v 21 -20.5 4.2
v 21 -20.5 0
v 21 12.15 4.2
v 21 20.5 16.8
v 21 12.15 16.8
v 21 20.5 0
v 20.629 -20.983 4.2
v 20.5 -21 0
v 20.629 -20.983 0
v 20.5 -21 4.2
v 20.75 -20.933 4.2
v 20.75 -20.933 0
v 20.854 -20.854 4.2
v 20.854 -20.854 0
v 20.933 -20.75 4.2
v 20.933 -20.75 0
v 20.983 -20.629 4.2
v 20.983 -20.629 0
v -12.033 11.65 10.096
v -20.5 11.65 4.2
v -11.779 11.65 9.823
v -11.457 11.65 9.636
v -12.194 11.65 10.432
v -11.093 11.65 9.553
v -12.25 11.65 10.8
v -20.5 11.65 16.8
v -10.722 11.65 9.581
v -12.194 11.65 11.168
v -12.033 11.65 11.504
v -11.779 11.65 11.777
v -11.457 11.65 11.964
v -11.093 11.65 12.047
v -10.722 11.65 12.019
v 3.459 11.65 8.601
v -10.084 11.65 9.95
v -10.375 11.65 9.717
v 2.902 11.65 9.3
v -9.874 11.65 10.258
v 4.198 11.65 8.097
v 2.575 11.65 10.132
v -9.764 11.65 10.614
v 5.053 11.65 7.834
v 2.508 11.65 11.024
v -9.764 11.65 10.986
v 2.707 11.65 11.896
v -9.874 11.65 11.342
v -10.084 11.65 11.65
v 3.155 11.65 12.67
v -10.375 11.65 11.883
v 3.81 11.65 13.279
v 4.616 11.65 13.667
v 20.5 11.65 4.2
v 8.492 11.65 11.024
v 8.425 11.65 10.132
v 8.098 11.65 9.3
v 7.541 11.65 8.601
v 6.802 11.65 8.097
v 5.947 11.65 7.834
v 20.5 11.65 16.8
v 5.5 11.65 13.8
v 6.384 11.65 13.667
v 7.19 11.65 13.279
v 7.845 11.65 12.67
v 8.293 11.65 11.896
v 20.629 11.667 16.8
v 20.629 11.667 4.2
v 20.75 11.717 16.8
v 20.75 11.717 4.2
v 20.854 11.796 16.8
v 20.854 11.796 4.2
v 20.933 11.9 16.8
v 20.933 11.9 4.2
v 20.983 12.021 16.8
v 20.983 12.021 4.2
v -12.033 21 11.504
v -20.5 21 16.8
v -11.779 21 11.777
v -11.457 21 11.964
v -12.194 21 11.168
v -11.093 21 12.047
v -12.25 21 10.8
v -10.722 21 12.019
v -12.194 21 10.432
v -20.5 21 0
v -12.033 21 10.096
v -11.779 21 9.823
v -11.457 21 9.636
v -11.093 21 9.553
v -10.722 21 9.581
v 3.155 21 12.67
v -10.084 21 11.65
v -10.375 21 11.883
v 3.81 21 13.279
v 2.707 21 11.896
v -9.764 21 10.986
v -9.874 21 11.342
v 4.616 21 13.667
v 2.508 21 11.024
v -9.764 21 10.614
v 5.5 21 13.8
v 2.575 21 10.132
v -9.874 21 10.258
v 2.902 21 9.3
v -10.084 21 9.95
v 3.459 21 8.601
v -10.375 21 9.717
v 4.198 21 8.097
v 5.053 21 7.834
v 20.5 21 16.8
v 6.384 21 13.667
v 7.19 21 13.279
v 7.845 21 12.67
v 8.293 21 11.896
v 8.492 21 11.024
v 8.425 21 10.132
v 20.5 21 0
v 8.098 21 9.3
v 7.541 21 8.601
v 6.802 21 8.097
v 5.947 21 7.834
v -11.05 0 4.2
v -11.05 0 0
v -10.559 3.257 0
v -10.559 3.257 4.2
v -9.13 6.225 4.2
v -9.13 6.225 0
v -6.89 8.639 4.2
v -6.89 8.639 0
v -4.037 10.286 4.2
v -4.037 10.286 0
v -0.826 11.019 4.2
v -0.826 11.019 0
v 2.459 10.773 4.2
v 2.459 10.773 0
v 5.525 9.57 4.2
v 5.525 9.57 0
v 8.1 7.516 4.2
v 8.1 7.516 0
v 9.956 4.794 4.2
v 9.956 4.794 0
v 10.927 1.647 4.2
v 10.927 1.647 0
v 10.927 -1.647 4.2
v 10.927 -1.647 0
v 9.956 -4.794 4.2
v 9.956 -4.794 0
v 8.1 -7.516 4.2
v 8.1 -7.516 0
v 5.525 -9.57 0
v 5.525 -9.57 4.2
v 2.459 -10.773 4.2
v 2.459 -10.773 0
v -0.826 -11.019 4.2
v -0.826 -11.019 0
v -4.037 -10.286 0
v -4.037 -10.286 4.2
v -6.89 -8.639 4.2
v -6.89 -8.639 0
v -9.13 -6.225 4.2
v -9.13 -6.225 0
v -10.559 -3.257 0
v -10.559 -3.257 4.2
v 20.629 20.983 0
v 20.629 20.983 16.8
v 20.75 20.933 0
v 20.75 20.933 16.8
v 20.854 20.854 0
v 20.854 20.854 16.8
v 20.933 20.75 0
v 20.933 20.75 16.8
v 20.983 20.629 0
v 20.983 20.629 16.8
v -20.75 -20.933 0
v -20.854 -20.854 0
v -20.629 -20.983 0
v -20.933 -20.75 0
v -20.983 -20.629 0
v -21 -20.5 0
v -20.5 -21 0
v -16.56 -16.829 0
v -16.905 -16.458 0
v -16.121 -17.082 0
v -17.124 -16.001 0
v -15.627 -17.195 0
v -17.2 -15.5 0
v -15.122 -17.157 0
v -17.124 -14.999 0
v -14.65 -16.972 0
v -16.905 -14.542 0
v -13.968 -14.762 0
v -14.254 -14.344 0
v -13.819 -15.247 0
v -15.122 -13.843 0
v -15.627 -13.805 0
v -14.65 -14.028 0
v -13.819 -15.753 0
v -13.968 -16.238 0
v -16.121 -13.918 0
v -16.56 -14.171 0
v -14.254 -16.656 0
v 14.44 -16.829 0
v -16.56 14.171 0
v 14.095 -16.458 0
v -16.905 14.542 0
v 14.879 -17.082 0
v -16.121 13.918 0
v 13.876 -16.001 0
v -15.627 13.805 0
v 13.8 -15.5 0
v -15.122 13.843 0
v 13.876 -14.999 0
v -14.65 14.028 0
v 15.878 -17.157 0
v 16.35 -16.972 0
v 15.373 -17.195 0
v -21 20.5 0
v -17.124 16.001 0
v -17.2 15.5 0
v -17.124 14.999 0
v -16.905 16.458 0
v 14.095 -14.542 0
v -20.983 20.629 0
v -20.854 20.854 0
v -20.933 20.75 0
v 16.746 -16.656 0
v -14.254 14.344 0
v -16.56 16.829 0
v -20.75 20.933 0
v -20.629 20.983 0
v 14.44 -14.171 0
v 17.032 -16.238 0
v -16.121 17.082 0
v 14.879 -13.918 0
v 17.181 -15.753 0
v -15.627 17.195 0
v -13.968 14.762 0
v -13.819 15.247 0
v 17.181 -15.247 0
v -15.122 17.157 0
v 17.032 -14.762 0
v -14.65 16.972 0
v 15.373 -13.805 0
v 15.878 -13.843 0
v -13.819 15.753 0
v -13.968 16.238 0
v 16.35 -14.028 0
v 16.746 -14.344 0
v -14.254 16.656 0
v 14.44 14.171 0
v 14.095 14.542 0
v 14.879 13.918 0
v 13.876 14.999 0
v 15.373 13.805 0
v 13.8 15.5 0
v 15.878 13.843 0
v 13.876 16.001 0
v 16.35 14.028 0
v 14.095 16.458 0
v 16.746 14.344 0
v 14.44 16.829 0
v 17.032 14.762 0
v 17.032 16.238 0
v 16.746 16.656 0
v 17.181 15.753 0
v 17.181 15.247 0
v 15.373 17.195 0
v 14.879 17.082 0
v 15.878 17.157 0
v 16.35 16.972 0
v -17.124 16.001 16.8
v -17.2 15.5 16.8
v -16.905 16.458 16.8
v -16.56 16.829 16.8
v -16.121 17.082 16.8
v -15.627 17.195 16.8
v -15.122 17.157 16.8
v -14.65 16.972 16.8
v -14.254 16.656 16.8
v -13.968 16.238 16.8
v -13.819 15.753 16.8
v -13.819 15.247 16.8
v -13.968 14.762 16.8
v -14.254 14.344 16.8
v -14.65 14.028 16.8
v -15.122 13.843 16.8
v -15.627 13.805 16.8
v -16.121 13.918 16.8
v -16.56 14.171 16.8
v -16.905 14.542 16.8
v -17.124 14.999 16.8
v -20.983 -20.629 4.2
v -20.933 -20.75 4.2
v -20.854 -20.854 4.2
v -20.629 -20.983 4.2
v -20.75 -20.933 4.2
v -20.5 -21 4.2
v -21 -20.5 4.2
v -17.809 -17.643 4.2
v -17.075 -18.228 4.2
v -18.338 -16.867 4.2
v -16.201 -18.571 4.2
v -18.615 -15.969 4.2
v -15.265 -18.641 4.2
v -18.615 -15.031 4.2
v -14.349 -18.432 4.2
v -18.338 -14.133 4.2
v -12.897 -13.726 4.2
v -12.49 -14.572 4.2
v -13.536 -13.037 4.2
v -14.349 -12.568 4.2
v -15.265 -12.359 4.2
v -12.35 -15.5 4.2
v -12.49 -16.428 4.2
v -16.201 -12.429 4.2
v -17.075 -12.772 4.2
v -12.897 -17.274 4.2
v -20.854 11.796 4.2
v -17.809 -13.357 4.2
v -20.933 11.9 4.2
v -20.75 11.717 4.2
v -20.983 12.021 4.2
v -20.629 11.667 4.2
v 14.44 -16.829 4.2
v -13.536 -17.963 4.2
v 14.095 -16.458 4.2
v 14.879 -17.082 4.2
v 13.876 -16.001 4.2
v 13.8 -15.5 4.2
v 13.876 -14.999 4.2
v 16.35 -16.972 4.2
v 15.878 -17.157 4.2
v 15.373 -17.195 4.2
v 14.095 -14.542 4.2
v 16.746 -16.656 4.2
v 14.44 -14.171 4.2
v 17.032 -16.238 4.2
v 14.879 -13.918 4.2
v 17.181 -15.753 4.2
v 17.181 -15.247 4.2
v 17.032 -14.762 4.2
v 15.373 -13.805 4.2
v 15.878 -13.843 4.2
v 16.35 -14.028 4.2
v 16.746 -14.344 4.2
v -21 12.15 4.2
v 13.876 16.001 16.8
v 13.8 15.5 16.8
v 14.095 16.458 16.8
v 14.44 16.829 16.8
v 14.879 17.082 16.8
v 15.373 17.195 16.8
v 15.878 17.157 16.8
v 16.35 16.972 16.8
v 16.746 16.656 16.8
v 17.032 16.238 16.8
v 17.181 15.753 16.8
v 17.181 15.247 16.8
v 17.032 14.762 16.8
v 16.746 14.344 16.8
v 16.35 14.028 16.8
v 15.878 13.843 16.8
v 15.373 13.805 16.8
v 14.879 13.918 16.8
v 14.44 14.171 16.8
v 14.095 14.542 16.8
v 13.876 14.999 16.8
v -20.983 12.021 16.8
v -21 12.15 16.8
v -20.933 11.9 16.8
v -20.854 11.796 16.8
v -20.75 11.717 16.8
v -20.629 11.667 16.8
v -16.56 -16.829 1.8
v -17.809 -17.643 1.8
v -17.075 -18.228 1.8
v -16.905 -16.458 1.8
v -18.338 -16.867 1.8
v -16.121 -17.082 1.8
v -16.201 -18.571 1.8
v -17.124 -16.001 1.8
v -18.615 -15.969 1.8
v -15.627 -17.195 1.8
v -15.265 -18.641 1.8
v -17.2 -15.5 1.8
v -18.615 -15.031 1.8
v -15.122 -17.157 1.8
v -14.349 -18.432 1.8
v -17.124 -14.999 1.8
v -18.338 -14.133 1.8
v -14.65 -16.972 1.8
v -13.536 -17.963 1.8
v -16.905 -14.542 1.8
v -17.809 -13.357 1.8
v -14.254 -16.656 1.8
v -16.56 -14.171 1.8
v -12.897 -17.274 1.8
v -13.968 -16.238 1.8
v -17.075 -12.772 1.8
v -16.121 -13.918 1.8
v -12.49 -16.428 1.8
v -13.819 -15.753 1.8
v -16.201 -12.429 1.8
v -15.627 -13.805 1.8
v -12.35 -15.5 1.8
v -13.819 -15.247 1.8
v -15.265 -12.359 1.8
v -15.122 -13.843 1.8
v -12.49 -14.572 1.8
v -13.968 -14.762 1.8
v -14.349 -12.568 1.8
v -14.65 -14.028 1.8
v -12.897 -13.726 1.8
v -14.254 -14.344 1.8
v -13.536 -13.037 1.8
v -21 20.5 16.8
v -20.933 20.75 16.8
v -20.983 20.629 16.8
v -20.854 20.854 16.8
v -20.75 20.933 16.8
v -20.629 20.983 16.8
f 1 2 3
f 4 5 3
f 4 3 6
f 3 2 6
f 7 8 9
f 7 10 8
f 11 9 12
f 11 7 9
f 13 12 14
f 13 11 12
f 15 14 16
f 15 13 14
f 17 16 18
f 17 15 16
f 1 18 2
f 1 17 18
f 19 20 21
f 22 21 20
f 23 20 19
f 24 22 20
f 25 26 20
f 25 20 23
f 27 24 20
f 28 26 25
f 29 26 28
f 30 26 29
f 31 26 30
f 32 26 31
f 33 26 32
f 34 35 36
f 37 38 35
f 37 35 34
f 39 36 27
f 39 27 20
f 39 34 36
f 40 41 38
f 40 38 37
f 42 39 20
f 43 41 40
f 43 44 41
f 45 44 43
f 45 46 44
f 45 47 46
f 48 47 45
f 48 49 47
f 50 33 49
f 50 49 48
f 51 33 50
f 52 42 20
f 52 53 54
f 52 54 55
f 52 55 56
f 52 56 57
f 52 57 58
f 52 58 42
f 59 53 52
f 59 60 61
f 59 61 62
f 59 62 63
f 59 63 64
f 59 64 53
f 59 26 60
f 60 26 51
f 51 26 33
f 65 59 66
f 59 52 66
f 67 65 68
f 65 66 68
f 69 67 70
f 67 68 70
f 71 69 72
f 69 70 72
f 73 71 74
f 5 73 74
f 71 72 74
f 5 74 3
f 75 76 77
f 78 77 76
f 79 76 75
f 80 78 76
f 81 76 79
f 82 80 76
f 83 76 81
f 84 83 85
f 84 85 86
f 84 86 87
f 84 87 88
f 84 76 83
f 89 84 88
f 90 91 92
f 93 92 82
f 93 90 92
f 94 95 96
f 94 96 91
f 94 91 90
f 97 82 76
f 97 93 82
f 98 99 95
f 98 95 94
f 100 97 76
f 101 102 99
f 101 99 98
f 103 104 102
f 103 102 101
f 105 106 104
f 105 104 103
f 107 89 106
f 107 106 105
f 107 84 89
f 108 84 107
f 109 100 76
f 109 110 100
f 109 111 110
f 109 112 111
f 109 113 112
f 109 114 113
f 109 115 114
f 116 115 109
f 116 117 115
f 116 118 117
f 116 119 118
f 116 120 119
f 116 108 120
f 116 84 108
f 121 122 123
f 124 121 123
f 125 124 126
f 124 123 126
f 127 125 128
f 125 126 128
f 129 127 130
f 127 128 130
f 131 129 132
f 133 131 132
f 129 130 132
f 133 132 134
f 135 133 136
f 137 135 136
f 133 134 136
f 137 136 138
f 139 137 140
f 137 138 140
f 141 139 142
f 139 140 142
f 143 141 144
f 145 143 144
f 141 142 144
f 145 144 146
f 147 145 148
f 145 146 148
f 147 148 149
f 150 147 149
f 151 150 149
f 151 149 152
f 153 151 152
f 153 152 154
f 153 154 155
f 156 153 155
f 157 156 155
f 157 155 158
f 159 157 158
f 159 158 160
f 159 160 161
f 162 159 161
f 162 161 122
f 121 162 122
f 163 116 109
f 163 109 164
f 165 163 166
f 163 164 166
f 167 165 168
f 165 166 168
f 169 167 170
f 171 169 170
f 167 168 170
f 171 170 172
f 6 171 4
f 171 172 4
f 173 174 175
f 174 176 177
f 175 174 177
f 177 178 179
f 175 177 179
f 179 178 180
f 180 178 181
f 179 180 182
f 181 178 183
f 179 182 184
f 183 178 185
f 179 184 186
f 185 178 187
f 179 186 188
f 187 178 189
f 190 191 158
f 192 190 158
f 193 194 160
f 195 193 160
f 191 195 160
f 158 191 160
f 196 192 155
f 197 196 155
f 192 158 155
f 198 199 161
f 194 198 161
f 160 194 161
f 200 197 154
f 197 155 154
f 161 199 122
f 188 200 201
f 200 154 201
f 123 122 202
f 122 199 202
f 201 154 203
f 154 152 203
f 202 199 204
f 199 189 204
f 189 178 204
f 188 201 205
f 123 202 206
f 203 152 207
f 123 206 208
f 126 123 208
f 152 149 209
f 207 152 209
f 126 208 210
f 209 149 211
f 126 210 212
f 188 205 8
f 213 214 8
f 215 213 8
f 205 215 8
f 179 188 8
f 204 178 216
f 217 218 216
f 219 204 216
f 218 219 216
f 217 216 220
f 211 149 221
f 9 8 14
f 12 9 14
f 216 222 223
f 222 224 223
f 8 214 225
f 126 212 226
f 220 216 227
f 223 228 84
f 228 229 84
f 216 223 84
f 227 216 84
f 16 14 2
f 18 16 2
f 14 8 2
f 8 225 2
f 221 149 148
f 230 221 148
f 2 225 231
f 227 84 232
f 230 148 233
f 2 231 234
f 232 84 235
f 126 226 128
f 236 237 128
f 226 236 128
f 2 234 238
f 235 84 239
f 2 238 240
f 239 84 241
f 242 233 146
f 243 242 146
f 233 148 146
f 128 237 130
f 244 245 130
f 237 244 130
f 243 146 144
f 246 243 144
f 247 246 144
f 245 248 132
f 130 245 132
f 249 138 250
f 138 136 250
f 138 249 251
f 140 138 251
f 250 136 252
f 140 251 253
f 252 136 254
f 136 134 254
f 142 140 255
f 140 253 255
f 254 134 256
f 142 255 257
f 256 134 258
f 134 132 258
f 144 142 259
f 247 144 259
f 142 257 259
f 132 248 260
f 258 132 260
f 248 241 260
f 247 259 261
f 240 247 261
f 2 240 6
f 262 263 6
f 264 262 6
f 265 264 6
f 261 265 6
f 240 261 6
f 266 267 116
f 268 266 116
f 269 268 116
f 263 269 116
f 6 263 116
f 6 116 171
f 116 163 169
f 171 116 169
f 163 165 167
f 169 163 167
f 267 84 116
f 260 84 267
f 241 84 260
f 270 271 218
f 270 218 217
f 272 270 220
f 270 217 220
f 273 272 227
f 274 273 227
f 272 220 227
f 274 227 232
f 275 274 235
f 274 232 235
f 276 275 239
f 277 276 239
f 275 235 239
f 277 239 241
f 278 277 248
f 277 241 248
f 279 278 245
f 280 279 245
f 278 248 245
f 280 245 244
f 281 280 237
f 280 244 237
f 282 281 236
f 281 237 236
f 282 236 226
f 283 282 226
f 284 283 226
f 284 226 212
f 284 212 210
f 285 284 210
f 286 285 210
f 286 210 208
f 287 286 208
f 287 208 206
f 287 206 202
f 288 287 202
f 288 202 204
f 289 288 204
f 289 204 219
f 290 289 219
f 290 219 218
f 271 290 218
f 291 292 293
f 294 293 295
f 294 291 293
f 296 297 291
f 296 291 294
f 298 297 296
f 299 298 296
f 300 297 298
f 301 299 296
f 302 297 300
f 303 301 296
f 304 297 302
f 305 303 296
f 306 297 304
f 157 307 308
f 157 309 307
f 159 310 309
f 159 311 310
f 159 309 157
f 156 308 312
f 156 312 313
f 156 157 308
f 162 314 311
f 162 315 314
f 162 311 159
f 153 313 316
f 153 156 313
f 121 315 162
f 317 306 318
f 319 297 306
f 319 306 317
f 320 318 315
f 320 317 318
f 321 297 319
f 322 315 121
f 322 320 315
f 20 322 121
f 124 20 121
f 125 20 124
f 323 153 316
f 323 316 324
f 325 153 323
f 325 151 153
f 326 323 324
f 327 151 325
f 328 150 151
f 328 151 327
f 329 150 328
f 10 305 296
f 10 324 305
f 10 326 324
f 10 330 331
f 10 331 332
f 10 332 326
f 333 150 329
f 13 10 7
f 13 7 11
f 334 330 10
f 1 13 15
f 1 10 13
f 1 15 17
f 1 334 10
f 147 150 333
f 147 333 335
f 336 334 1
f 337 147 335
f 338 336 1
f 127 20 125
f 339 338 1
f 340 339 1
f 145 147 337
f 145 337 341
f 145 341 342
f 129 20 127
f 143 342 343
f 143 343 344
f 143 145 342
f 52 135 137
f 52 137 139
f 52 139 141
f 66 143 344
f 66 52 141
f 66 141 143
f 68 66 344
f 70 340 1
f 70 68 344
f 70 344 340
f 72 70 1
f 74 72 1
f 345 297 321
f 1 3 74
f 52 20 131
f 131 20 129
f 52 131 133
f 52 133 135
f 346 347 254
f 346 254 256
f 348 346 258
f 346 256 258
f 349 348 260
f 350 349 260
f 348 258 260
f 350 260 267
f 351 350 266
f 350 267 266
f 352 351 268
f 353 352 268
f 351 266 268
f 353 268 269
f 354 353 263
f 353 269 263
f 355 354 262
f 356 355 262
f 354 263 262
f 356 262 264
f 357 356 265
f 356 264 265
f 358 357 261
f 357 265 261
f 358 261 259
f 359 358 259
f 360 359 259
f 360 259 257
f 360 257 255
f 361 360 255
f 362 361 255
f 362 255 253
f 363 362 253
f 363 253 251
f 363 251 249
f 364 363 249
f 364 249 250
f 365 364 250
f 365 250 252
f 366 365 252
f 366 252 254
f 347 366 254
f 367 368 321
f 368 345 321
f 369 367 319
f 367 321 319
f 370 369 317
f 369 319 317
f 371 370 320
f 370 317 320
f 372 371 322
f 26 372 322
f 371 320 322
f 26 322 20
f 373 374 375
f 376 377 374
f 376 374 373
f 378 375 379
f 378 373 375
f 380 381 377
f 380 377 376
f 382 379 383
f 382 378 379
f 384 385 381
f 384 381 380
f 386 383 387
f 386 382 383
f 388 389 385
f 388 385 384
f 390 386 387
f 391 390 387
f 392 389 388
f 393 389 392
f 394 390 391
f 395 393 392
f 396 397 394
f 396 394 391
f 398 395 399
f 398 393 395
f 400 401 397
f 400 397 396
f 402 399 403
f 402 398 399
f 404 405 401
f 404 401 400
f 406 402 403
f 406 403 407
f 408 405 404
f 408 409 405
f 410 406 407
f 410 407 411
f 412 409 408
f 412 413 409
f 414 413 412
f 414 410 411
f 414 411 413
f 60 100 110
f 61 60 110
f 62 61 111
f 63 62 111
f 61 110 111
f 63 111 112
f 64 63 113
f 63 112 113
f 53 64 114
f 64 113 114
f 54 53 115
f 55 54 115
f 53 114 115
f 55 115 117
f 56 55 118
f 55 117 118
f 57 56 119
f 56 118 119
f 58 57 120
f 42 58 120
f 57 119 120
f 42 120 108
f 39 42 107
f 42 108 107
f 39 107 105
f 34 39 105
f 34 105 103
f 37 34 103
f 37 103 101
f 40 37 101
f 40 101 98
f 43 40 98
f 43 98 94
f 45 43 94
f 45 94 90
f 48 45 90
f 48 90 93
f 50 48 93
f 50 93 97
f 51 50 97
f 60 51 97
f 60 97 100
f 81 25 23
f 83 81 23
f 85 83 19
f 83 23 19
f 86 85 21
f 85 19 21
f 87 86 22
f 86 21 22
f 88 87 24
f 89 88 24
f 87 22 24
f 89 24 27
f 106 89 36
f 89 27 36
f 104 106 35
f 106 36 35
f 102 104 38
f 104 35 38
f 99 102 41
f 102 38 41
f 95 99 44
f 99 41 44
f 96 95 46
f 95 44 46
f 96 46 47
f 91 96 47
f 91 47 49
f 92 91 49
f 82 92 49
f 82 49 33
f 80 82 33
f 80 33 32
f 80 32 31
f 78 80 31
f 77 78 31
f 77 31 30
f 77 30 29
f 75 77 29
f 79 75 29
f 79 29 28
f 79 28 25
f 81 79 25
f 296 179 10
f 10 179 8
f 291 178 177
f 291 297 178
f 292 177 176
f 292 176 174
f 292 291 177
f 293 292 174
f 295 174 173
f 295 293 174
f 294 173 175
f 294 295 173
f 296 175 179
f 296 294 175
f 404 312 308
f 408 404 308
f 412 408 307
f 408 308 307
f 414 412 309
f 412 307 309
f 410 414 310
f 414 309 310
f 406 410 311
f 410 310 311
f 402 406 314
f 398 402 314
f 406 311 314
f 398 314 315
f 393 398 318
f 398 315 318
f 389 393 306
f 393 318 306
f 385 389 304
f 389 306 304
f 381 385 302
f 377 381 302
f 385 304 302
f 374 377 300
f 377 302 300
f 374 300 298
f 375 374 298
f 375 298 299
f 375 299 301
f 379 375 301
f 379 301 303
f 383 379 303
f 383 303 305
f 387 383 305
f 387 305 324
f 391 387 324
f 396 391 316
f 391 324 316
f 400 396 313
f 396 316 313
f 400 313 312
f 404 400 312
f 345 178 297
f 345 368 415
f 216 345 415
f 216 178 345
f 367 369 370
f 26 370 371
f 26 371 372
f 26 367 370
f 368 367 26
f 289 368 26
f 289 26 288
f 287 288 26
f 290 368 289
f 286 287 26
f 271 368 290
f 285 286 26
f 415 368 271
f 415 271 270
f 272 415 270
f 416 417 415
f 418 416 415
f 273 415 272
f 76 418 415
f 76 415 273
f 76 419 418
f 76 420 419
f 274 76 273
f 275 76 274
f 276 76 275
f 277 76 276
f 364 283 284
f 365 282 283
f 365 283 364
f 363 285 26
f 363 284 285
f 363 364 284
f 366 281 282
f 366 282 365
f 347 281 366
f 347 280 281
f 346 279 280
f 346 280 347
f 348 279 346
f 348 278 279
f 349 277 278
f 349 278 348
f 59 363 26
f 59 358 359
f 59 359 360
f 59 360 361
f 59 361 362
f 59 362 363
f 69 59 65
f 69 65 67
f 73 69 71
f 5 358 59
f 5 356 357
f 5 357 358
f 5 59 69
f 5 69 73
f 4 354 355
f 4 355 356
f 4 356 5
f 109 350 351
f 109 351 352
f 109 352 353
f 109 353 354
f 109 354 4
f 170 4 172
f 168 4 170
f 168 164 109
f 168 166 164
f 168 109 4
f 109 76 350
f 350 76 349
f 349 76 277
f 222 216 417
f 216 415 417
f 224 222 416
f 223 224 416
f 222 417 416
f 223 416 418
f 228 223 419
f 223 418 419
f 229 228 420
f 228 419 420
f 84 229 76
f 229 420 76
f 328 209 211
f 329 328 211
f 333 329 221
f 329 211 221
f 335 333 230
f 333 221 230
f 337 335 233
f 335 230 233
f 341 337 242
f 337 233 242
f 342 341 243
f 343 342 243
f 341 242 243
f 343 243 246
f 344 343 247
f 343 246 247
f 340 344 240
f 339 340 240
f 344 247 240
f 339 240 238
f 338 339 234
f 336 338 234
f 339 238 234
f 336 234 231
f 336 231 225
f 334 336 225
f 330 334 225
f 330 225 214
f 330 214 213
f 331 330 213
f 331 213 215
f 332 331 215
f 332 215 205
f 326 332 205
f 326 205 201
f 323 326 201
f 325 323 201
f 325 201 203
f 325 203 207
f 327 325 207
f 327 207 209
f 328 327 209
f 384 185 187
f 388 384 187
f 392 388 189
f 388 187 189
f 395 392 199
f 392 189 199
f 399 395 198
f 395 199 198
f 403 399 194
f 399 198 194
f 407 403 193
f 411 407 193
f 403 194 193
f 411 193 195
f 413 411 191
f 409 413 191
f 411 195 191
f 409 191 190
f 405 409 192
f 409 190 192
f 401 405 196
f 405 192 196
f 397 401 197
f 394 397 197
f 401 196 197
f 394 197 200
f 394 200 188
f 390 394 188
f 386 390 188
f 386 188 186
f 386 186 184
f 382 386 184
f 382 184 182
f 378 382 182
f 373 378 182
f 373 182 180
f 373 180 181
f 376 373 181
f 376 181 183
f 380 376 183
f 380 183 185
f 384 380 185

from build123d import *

# Parameters (mm, degrees)
SKETCH1_W            = 42
SKETCH1_H            = 42
BOSS_EXTRUDE1_DEPTH  = 16.8
SKETCH2_W            = 42
SKETCH2_H            = 32.65
CUT_EXTRUDE1_DEPTH   = 12.6
CUT_EXTRUDE2_REACH   = 36.121
SKETCH3_R            = 11.05
M3_CLEARANCE_HOLE1_D = 3.4
SKETCH6_R            = 3.15
CUT_EXTRUDE3_DEPTH   = 2.4
M3_TAPPED_HOLE1_D    = 2.5
FILLET1_R            = 0.5
SKETCH11_R           = 3
CUT_EXTRUDE4_DEPTH   = 10


with BuildPart() as part:
    # Sketch1 → Boss-Extrude1 (new body)
    with BuildSketch(Plane.XY):
        Rectangle(SKETCH1_W, SKETCH1_H)
    extrude(amount=BOSS_EXTRUDE1_DEPTH)

    # Sketch2 → Cut-Extrude1 (cut)
    with BuildSketch(Plane.XY.offset(16.8)):
        with Locations((0, -4.675)):
            Rectangle(SKETCH2_W, SKETCH2_H)
    extrude(amount=-CUT_EXTRUDE1_DEPTH, mode=Mode.SUBTRACT)

    # Sketch3 → Cut-Extrude2 (cut, up to next)
    with BuildSketch(Plane(origin=(0, 0, 0), x_dir=(-1, 0, 0), z_dir=(0, 0, -1)), mode=Mode.PRIVATE) as cut_extrude2_sk1:
        Circle(SKETCH3_R)
    cut_extrude2_tool1 = extrude(cut_extrude2_sk1.sketch, amount=-CUT_EXTRUDE2_REACH, mode=Mode.PRIVATE) & part.part
    add(cut_extrude2_tool1.solids().sort_by_distance((0, 0, 0))[0], mode=Mode.SUBTRACT)

    # M3 Clearance Hole1 (through all)
    with Locations(Plane.XY.offset(16.8)):
        with Locations((15.5, 15.5), (-15.5, 15.5), (-15.5, -15.5), (15.5, -15.5)):
            Hole(M3_CLEARANCE_HOLE1_D / 2)

    # Sketch6 → Cut-Extrude3 (cut)
    with BuildSketch(Plane.XY.offset(4.2)):
        with Locations((-15.5, -15.5)):
            Circle(SKETCH6_R)
    extrude(amount=-CUT_EXTRUDE3_DEPTH, mode=Mode.SUBTRACT)

    # M3 Tapped Hole1 (through all)
    with Locations(Plane(origin=(0, 21, 0), x_dir=(1, 0, 0), z_dir=(0, 1, 0))):
        with Locations((-11, -10.8)):
            Hole(M3_TAPPED_HOLE1_D / 2)

    # Fillet1
    fillet1_edges = [part.edges().sort_by_distance(p)[0] for p in [
        (21, -21, 2.1),
        (-21, -21, 2.1),
        (-21, 11.65, 10.5),
        (21, 11.65, 10.5),
        (-21, 21, 8.4),
        (21, 21, 8.4),
    ]]
    fillet(fillet1_edges, radius=FILLET1_R)

    # Sketch11 → Cut-Extrude4 (cut)
    with BuildSketch(Plane(origin=(0, 21, 0), x_dir=(1, 0, 0), z_dir=(0, 1, 0))):
        with Locations(Location((5.5, -10.8, 0), (0, 0, 270))):
            Circle(SKETCH11_R)
    extrude(amount=-CUT_EXTRUDE4_DEPTH, mode=Mode.SUBTRACT)


solid = part.part
